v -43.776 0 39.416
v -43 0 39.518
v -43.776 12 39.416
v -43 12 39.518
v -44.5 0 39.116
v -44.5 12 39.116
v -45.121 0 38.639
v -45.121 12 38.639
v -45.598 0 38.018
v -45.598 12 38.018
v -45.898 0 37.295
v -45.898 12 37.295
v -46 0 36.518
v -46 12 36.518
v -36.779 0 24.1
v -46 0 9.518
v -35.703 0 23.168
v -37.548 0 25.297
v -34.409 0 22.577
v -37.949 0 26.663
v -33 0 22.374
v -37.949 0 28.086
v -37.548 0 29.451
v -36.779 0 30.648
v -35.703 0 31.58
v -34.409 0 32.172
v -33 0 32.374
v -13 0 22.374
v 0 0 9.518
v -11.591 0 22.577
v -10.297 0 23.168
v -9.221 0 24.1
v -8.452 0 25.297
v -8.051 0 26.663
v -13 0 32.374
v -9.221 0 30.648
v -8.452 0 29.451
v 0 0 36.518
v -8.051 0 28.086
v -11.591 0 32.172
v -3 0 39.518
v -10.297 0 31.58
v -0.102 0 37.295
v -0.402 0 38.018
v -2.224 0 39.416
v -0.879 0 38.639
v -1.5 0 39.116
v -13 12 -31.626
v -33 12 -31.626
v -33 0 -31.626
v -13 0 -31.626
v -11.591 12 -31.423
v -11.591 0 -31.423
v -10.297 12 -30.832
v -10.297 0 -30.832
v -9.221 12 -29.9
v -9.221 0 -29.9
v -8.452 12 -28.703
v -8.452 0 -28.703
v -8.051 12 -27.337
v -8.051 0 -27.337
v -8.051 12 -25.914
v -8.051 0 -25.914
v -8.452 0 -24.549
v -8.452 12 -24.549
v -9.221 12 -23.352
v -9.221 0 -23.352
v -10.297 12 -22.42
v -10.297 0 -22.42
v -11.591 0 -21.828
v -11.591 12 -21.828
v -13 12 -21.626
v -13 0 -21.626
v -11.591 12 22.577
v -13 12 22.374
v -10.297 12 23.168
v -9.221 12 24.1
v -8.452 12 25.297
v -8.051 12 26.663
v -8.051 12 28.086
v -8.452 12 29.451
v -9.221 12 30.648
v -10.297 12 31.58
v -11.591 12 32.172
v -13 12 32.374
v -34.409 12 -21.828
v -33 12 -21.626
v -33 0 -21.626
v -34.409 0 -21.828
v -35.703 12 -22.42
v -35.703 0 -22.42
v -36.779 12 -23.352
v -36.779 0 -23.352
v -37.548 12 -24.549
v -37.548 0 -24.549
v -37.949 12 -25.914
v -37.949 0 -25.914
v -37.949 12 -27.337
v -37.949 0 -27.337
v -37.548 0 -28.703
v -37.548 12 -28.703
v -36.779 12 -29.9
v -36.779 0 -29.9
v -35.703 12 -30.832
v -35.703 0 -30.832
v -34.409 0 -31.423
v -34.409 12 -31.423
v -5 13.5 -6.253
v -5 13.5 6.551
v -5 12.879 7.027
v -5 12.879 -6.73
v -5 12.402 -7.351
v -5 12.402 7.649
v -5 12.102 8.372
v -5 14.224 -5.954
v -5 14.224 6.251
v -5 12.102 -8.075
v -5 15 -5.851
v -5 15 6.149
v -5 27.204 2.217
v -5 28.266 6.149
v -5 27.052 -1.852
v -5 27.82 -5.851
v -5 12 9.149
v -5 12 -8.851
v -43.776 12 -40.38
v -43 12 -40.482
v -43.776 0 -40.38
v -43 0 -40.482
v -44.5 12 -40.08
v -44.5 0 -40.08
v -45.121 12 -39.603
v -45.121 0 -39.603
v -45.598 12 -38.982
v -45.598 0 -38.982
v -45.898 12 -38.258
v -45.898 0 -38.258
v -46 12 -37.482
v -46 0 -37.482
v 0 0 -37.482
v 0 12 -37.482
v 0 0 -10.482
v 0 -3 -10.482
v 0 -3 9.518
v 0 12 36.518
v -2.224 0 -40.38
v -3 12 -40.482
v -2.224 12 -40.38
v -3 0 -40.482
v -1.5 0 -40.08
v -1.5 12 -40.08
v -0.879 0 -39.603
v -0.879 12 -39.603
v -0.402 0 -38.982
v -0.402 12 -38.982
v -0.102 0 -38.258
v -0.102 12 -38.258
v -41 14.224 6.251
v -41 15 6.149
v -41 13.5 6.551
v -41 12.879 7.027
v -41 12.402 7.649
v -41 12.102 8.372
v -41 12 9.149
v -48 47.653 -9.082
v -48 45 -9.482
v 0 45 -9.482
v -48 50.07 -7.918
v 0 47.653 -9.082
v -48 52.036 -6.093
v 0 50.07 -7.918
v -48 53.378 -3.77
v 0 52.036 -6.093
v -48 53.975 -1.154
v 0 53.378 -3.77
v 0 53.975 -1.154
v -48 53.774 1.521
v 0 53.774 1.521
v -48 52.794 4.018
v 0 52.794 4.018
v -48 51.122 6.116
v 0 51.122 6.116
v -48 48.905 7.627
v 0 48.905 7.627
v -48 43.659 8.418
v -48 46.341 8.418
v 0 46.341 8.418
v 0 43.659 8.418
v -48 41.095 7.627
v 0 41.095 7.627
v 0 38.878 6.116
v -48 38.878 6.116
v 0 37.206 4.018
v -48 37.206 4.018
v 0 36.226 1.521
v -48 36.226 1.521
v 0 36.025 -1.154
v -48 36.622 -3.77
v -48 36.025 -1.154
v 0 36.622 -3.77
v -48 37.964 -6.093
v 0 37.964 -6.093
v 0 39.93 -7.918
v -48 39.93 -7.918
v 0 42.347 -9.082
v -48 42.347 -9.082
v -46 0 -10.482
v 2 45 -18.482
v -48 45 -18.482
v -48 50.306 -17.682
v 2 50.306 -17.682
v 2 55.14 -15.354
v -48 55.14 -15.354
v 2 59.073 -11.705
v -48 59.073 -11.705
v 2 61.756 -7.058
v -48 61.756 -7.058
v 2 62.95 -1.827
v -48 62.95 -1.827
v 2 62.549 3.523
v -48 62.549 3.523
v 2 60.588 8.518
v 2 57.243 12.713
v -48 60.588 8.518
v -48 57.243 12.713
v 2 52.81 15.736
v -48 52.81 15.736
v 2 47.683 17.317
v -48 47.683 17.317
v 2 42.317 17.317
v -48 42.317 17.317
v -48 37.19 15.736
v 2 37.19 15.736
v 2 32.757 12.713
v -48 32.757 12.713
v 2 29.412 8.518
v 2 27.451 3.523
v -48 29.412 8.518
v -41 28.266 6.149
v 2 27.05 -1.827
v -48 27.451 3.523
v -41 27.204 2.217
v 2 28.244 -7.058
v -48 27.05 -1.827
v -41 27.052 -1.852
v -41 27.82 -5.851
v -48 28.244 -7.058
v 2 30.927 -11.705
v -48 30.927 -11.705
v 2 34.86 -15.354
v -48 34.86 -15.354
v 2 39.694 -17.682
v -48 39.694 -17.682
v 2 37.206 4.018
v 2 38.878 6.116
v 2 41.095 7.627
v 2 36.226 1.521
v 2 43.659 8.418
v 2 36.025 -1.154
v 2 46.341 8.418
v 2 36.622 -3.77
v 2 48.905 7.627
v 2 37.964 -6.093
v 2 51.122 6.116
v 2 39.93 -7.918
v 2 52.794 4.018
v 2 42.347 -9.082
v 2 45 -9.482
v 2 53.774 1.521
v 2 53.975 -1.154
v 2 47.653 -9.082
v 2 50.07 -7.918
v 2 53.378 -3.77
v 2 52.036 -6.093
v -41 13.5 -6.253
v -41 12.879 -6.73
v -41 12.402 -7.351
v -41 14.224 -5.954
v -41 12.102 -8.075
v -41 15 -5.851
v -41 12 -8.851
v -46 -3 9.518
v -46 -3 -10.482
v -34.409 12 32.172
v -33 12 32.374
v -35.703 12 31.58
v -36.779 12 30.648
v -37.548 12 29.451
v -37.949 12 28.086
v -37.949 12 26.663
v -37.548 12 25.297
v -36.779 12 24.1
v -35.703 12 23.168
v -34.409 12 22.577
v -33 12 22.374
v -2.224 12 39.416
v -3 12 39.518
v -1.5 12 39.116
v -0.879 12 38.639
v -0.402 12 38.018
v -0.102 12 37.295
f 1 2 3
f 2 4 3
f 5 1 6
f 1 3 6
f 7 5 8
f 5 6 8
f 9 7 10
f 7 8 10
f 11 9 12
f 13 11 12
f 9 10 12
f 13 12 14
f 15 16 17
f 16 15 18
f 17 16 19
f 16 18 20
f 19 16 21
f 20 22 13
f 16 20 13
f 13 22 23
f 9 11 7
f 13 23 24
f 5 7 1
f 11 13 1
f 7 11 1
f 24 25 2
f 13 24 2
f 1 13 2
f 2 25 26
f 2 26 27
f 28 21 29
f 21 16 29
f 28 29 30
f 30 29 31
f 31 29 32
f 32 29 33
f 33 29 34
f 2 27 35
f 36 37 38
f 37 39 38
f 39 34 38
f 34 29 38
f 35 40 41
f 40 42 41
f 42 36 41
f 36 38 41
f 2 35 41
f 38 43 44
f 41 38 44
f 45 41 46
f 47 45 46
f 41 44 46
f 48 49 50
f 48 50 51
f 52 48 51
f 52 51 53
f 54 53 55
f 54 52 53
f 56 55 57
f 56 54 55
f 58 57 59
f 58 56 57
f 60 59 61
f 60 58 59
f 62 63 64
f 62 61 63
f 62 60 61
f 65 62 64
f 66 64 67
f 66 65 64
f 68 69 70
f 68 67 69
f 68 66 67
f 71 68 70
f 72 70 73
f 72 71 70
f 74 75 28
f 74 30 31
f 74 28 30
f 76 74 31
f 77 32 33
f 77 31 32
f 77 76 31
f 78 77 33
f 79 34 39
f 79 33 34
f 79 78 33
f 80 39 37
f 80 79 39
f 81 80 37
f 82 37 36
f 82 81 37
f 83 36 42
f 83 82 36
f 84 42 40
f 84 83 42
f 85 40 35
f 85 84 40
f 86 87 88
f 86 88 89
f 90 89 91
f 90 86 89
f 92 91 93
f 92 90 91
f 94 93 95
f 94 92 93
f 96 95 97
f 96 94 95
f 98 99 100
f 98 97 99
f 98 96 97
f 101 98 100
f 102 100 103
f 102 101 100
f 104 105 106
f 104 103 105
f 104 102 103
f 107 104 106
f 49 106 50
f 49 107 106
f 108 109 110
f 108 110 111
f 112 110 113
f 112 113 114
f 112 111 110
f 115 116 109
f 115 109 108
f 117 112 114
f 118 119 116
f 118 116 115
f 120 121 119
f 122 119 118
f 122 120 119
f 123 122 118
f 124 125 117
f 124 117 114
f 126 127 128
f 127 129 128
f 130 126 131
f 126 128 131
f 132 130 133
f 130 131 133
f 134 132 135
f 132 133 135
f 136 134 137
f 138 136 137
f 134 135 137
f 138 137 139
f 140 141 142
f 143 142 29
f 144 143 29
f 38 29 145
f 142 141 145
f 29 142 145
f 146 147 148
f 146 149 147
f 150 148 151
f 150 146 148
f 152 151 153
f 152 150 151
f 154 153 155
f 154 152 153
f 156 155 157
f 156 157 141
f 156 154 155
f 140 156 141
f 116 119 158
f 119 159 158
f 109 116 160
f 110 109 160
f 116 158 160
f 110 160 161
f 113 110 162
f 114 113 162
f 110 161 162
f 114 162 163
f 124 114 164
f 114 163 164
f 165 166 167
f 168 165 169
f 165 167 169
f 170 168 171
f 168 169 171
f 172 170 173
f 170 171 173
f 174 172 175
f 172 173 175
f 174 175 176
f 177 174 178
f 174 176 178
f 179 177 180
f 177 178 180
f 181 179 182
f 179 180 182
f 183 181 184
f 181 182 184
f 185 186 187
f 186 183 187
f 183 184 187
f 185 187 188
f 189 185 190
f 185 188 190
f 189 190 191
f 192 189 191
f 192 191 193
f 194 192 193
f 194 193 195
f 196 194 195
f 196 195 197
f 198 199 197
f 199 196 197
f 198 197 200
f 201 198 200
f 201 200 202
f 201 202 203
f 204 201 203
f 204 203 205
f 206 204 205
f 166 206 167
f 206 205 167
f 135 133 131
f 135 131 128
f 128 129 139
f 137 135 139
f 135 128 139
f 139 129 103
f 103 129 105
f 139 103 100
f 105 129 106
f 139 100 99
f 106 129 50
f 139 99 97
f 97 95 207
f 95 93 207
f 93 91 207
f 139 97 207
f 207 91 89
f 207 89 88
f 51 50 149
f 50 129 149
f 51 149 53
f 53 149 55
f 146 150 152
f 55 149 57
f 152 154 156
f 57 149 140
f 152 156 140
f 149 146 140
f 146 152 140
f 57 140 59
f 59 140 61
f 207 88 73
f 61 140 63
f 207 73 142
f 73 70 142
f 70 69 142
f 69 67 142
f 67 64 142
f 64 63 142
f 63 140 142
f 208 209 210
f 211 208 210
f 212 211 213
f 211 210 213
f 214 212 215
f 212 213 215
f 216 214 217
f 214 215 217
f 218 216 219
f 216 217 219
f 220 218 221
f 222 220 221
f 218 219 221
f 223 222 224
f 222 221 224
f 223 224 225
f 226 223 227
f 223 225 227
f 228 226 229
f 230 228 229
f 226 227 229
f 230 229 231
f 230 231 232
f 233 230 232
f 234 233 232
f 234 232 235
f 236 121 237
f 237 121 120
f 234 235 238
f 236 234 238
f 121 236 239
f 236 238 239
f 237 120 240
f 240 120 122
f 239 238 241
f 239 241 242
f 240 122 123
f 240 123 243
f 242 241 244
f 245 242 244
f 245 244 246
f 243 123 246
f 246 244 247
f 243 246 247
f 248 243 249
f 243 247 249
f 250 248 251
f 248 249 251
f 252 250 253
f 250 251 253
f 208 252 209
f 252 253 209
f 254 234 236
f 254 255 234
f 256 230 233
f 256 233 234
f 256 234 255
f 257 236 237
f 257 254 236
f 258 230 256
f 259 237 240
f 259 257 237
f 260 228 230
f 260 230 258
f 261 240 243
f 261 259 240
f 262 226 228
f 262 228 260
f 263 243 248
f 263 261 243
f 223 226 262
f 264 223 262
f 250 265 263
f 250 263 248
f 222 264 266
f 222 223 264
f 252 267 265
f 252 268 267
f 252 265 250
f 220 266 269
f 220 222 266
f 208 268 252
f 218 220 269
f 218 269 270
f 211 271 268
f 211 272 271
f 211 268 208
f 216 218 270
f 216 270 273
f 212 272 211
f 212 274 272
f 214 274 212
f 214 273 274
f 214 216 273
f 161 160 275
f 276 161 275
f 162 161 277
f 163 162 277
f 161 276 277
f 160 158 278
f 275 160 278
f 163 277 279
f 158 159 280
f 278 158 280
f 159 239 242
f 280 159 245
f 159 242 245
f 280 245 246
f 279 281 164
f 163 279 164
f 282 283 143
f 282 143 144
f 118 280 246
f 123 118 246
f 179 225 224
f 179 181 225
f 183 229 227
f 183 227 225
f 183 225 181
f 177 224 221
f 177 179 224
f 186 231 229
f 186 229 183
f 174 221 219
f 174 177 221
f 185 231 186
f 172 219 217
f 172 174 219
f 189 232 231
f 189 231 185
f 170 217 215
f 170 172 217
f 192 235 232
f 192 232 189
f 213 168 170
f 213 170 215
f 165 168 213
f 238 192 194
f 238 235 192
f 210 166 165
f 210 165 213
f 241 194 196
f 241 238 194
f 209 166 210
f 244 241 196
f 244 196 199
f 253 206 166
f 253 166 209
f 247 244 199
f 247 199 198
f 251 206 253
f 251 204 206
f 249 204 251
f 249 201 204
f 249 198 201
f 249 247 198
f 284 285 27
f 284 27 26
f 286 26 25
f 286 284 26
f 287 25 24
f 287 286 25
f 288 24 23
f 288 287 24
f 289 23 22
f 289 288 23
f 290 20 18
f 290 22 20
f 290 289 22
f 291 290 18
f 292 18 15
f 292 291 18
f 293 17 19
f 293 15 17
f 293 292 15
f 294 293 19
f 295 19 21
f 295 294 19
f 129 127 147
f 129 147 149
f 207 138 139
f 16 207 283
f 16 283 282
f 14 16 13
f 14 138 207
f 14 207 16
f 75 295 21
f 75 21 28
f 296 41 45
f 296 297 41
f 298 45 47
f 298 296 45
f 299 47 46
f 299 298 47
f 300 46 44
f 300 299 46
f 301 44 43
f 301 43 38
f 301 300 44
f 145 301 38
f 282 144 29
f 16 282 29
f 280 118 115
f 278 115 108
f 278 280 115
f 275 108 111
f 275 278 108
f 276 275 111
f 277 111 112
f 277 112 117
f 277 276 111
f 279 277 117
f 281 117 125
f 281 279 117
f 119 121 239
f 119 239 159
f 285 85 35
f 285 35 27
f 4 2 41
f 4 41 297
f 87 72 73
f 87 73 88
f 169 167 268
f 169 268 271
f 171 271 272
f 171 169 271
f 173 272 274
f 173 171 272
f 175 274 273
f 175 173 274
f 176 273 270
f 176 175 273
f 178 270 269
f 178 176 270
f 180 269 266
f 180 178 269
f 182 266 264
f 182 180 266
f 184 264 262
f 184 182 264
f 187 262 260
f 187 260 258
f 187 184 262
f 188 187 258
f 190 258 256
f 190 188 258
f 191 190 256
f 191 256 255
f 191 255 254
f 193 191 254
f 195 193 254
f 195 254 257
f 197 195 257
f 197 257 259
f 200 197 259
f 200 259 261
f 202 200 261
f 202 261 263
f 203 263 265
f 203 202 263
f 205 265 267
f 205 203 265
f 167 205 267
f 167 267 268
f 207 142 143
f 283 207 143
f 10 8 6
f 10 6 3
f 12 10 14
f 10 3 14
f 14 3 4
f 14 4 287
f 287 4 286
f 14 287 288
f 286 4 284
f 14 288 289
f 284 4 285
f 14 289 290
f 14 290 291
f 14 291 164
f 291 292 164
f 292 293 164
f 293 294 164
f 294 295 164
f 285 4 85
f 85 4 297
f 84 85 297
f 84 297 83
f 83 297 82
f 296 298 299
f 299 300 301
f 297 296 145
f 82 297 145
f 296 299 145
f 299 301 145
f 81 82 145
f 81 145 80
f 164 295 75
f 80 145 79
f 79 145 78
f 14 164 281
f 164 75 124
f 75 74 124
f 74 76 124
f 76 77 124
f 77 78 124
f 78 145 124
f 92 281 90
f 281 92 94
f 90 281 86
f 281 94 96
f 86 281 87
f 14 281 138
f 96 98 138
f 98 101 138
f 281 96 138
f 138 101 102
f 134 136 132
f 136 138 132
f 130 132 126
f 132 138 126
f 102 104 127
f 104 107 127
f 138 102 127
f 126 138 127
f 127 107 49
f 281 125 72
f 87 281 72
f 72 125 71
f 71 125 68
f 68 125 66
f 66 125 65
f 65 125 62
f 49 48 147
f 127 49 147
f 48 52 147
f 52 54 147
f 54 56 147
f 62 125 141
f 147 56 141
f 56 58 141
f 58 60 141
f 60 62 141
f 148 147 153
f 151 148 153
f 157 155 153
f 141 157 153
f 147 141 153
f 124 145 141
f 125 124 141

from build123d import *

# Parameters (mm, degrees)
BOSS_EXTRUDE2_DEPTH = 46
FILLET1_R           = 3
CUT_EXTRUDE1_DEPTH  = 46
SKETCH5_R           = 18
SKETCH5_R_2         = 9
BOSS_EXTRUDE3_DEPTH = 50
SKETCH6_R           = 18
SKETCH6_R_2         = 9
BOSS_EXTRUDE4_DEPTH = 2
SKETCH7_R           = 18
SKETCH7_R_2         = 9
CUT_EXTRUDE2_DEPTH  = 2
BOSS_EXTRUDE5_DEPTH = 36
FILLET2_R           = 3


with BuildPart() as part:
    # Sketch3 → Boss-Extrude2 (new body)
    with BuildSketch(Plane(origin=(0, 0, 0), x_dir=(0, 0, -1), z_dir=(1, 0, 0))):
        Polygon((-39.518072289, 0), (-39.518072289, 12), (40.481927711, 12), (40.481927711, 0), (10.481927711, 0), (10.481927711, -3), (-9.518072289, -3), (-9.518072289, 0), align=None)
    extrude(amount=-BOSS_EXTRUDE2_DEPTH)

    # Fillet1
    fillet1_edges = [part.edges().sort_by_distance(p)[0] for p in [
        (-46, 6, -40.481927711),
        (-46, 6, 39.518072289),
        (0, 6, 39.518072289),
        (0, 6, -40.481927711),
    ]]
    fillet(fillet1_edges, radius=FILLET1_R)

    # Sketch4 → Cut-Extrude1 (cut)
    with BuildSketch(Plane(origin=(0, 12, 0), x_dir=(1, 0, 0), z_dir=(0, 1, 0))):
        with BuildLine():
            Line((-33, -22.374092955), (-13, -22.374092955))
            ThreePointArc((-13, -22.374092955), (-8, -27.374092955), (-13, -32.374092955))
            Line((-13, -32.374092955), (-33, -32.374092955))
            ThreePointArc((-33, -32.374092955), (-38, -27.374092955), (-33, -22.374092955))
        make_face()
        with BuildLine():
            Line((-33, 31.625907045), (-13, 31.625907045))
            ThreePointArc((-13, 31.625907045), (-8, 26.625907045), (-13, 21.625907045))
            Line((-13, 21.625907045), (-33, 21.625907045))
            ThreePointArc((-33, 21.625907045), (-38, 26.625907045), (-33, 31.625907045))
        make_face()
    extrude(amount=-CUT_EXTRUDE1_DEPTH, mode=Mode.SUBTRACT)



with BuildPart() as body_2:
    # Sketch5 → Boss-Extrude3 (new body)
    with BuildSketch(Plane(origin=(0, 0, 0), x_dir=(0, 0, -1), z_dir=(1, 0, 0))):
        with Locations((0.481927711, 45)):
            Circle(SKETCH5_R)
        with Locations((0.481927711, 45)):
            Circle(SKETCH5_R_2, mode=Mode.SUBTRACT)
    extrude(amount=-BOSS_EXTRUDE3_DEPTH)

    # Sketch6 → Boss-Extrude4 (add)
    with BuildSketch(Plane(origin=(0, 0, 0), x_dir=(0, 0, -1), z_dir=(1, 0, 0))):
        with Locations((0.481927711, 45)):
            Circle(SKETCH6_R)
        with Locations((0.481927711, 45)):
            Circle(SKETCH6_R_2, mode=Mode.SUBTRACT)
    extrude(amount=BOSS_EXTRUDE4_DEPTH)

    # Sketch7 → Cut-Extrude2 (cut)
    with BuildSketch(Plane.ZY.offset(50)):
        with Locations(Location((-0.481927711, 45, 0), (0, 0, 180))):
            Circle(SKETCH7_R)
        with Locations(Location((-0.481927711, 45, 0), (0, 0, 180))):
            Circle(SKETCH7_R_2, mode=Mode.SUBTRACT)
    extrude(amount=-CUT_EXTRUDE2_DEPTH, mode=Mode.SUBTRACT)


with BuildPart() as part_1:
    add(part.part)

    add(body_2.part)  # Boss-Extrude5 merges body 2
    # Sketch8 → Boss-Extrude5 (add)
    with BuildSketch(Plane(origin=(-5, 0, 0), x_dir=(0, 0, -1), z_dir=(1, 0, 0))):
        with BuildLine():
            Line((-6.148609037, 28.265724323), (-6.148609037, 12))
            Line((-6.148609037, 12), (5.851390963, 12))
            Line((5.851390963, 12), (5.851390963, 27.819520834))
            ThreePointArc((5.851390963, 27.819520834), (-0.186915304, 27.012430708), (-6.148609037, 28.265724323))
        make_face()
    extrude(amount=-BOSS_EXTRUDE5_DEPTH)

    # Fillet2
    fillet2_edges = [part_1.edges().sort_by_distance(p)[0] for p in [
        (-23, 12, -5.851390963),
        (-23, 12, 6.148609037),
    ]]
    fillet(fillet2_edges, radius=FILLET2_R)


solid = part_1.part
